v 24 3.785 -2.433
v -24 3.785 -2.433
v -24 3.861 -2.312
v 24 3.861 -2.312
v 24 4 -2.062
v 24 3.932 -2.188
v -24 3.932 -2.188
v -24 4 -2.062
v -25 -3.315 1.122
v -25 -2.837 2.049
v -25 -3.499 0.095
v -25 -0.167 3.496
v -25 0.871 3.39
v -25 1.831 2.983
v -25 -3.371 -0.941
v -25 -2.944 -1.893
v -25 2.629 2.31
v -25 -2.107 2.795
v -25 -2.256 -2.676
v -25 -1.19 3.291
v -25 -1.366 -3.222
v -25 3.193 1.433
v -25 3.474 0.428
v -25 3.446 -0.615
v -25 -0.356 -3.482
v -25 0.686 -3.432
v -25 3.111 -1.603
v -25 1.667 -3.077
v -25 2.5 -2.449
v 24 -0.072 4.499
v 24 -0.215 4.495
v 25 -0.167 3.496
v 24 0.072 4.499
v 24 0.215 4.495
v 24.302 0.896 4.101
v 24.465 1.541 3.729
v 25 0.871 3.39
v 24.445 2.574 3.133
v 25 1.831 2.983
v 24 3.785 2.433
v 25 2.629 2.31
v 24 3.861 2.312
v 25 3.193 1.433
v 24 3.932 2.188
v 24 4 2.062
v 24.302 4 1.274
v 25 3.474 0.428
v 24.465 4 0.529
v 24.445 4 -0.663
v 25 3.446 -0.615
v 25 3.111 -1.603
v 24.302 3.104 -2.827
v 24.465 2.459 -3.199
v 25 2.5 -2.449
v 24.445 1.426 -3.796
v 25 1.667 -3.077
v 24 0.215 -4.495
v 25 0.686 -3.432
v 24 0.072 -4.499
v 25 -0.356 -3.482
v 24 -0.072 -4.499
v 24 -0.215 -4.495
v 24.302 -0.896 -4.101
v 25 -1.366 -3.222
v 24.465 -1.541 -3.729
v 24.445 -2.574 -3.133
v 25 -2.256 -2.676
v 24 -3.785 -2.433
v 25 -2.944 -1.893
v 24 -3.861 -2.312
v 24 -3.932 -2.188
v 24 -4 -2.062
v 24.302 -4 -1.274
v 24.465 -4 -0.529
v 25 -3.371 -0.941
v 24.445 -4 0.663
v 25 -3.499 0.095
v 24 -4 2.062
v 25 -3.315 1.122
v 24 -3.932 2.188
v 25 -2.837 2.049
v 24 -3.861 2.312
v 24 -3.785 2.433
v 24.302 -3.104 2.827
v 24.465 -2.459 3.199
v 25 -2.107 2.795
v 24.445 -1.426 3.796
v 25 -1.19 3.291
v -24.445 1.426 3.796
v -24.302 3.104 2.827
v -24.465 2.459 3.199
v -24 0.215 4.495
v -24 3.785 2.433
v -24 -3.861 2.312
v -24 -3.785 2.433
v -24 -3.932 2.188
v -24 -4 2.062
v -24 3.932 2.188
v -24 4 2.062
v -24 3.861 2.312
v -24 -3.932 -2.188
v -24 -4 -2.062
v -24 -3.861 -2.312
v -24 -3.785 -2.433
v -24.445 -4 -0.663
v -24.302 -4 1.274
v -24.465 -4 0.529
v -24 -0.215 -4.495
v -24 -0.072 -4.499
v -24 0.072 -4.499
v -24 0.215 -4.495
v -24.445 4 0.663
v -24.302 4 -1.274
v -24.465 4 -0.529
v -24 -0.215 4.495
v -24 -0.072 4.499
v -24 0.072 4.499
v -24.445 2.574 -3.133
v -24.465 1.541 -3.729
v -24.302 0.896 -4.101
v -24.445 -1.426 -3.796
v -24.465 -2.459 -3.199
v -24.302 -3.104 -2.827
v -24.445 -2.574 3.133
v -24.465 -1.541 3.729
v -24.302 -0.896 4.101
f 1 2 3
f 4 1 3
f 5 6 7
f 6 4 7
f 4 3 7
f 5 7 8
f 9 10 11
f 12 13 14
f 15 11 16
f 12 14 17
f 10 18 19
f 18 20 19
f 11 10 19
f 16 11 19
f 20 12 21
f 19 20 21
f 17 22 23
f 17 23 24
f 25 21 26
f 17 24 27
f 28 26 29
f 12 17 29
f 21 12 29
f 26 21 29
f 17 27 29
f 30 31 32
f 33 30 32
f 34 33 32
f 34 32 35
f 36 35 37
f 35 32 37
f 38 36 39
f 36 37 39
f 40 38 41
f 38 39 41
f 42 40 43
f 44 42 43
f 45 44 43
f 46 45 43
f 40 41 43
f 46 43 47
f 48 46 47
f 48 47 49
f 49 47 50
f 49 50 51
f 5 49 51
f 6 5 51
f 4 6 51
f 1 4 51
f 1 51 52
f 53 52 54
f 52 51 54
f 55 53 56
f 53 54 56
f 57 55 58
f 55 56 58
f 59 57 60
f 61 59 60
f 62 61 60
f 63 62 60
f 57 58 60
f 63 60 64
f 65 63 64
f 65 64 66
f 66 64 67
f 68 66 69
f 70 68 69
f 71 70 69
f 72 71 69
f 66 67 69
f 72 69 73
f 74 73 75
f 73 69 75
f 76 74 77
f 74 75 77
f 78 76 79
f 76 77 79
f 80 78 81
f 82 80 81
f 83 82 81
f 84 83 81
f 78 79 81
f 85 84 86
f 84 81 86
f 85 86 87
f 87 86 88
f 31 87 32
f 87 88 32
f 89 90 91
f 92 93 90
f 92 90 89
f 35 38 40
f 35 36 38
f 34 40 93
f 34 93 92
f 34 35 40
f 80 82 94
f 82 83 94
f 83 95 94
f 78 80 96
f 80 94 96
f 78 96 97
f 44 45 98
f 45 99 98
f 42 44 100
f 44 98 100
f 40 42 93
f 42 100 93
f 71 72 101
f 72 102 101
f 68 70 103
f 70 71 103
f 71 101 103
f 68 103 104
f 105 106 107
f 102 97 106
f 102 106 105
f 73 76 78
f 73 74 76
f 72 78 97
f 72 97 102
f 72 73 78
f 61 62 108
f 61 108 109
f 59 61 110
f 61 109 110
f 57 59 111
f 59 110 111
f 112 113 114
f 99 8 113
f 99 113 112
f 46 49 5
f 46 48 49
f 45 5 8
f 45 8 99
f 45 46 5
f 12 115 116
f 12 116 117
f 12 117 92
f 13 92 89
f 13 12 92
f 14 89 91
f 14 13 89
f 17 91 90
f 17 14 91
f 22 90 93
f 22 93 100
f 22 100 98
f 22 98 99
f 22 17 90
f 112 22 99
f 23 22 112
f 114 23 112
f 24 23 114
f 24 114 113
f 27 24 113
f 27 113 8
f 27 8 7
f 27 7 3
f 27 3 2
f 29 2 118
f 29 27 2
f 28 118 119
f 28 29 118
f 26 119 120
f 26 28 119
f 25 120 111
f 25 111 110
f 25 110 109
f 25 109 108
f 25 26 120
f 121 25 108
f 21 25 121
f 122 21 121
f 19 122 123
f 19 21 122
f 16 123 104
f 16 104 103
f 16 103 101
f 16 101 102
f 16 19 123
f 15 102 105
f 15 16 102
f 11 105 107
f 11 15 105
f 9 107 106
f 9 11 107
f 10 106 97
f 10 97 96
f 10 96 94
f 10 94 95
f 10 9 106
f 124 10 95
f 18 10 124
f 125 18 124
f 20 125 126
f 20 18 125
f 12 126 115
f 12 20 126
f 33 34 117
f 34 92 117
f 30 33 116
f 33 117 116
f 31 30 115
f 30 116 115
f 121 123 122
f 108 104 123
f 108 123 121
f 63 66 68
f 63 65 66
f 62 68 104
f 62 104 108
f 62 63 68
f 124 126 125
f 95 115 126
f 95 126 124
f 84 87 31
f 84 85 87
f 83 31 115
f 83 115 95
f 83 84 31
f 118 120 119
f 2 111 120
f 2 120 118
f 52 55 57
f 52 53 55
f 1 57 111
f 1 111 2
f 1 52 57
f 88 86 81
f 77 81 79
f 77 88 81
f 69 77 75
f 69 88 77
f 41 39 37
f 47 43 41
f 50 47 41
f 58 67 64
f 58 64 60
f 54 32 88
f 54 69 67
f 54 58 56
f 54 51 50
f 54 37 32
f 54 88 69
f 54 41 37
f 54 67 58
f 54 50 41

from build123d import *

# Parameters (mm, degrees)
EXTRUDE_306_DEPTH          = 25
CUT_EXTRUDE_407_DEPTH      = 26.735837529
CUT_EXTRUDE_407_DEPTH_BACK = 26.735837529
SKETCH_8_R                 = 5.5
SKETCH_8_R_2               = 4.5


with BuildPart() as part:
    # 草图1 → Extrude 306 (new, symmetric)
    with BuildSketch(Plane(origin=(0, 0, 0), x_dir=(0, 0, -1), z_dir=(1, 0, 0))):
        Polygon((4.618802154, 0), (2.309401077, 4), (-2.309401077, 4), (-4.618802154, 0), (-2.309401077, -4), (2.309401077, -4), align=None)
    extrude(amount=EXTRUDE_306_DEPTH, both=True)

    # 草图8 → Cut-Extrude 407 (cut, two sides: drawn at the far end of the back side and taken through both)
    with BuildSketch(Plane(origin=(0, 0, 0), x_dir=(0, 0, -1), z_dir=(1, 0, 0)).offset(-CUT_EXTRUDE_407_DEPTH_BACK)):
        Circle(SKETCH_8_R)
        Circle(SKETCH_8_R_2, mode=Mode.SUBTRACT)
    extrude(amount=CUT_EXTRUDE_407_DEPTH + CUT_EXTRUDE_407_DEPTH_BACK, mode=Mode.SUBTRACT)

    # 草图10 → Cut-Revolve 698 (revolve, cut)
    with BuildSketch(Plane.XY, mode=Mode.PRIVATE) as cut_revolve_698_sk:
        Polygon((-25.5, 4.5), (-24, 4.5), (-25.5, 3), align=None)
        Polygon((24, 4.5), (25.5, 3), (25.5, 4.5), align=None)
    revolve(cut_revolve_698_sk.sketch.rotate(Axis((25, 0, 0), (-1, 0, 0)), 267.266044451), axis=Axis((25, 0, 0), (-1, 0, 0)), mode=Mode.SUBTRACT)


solid = part.part
